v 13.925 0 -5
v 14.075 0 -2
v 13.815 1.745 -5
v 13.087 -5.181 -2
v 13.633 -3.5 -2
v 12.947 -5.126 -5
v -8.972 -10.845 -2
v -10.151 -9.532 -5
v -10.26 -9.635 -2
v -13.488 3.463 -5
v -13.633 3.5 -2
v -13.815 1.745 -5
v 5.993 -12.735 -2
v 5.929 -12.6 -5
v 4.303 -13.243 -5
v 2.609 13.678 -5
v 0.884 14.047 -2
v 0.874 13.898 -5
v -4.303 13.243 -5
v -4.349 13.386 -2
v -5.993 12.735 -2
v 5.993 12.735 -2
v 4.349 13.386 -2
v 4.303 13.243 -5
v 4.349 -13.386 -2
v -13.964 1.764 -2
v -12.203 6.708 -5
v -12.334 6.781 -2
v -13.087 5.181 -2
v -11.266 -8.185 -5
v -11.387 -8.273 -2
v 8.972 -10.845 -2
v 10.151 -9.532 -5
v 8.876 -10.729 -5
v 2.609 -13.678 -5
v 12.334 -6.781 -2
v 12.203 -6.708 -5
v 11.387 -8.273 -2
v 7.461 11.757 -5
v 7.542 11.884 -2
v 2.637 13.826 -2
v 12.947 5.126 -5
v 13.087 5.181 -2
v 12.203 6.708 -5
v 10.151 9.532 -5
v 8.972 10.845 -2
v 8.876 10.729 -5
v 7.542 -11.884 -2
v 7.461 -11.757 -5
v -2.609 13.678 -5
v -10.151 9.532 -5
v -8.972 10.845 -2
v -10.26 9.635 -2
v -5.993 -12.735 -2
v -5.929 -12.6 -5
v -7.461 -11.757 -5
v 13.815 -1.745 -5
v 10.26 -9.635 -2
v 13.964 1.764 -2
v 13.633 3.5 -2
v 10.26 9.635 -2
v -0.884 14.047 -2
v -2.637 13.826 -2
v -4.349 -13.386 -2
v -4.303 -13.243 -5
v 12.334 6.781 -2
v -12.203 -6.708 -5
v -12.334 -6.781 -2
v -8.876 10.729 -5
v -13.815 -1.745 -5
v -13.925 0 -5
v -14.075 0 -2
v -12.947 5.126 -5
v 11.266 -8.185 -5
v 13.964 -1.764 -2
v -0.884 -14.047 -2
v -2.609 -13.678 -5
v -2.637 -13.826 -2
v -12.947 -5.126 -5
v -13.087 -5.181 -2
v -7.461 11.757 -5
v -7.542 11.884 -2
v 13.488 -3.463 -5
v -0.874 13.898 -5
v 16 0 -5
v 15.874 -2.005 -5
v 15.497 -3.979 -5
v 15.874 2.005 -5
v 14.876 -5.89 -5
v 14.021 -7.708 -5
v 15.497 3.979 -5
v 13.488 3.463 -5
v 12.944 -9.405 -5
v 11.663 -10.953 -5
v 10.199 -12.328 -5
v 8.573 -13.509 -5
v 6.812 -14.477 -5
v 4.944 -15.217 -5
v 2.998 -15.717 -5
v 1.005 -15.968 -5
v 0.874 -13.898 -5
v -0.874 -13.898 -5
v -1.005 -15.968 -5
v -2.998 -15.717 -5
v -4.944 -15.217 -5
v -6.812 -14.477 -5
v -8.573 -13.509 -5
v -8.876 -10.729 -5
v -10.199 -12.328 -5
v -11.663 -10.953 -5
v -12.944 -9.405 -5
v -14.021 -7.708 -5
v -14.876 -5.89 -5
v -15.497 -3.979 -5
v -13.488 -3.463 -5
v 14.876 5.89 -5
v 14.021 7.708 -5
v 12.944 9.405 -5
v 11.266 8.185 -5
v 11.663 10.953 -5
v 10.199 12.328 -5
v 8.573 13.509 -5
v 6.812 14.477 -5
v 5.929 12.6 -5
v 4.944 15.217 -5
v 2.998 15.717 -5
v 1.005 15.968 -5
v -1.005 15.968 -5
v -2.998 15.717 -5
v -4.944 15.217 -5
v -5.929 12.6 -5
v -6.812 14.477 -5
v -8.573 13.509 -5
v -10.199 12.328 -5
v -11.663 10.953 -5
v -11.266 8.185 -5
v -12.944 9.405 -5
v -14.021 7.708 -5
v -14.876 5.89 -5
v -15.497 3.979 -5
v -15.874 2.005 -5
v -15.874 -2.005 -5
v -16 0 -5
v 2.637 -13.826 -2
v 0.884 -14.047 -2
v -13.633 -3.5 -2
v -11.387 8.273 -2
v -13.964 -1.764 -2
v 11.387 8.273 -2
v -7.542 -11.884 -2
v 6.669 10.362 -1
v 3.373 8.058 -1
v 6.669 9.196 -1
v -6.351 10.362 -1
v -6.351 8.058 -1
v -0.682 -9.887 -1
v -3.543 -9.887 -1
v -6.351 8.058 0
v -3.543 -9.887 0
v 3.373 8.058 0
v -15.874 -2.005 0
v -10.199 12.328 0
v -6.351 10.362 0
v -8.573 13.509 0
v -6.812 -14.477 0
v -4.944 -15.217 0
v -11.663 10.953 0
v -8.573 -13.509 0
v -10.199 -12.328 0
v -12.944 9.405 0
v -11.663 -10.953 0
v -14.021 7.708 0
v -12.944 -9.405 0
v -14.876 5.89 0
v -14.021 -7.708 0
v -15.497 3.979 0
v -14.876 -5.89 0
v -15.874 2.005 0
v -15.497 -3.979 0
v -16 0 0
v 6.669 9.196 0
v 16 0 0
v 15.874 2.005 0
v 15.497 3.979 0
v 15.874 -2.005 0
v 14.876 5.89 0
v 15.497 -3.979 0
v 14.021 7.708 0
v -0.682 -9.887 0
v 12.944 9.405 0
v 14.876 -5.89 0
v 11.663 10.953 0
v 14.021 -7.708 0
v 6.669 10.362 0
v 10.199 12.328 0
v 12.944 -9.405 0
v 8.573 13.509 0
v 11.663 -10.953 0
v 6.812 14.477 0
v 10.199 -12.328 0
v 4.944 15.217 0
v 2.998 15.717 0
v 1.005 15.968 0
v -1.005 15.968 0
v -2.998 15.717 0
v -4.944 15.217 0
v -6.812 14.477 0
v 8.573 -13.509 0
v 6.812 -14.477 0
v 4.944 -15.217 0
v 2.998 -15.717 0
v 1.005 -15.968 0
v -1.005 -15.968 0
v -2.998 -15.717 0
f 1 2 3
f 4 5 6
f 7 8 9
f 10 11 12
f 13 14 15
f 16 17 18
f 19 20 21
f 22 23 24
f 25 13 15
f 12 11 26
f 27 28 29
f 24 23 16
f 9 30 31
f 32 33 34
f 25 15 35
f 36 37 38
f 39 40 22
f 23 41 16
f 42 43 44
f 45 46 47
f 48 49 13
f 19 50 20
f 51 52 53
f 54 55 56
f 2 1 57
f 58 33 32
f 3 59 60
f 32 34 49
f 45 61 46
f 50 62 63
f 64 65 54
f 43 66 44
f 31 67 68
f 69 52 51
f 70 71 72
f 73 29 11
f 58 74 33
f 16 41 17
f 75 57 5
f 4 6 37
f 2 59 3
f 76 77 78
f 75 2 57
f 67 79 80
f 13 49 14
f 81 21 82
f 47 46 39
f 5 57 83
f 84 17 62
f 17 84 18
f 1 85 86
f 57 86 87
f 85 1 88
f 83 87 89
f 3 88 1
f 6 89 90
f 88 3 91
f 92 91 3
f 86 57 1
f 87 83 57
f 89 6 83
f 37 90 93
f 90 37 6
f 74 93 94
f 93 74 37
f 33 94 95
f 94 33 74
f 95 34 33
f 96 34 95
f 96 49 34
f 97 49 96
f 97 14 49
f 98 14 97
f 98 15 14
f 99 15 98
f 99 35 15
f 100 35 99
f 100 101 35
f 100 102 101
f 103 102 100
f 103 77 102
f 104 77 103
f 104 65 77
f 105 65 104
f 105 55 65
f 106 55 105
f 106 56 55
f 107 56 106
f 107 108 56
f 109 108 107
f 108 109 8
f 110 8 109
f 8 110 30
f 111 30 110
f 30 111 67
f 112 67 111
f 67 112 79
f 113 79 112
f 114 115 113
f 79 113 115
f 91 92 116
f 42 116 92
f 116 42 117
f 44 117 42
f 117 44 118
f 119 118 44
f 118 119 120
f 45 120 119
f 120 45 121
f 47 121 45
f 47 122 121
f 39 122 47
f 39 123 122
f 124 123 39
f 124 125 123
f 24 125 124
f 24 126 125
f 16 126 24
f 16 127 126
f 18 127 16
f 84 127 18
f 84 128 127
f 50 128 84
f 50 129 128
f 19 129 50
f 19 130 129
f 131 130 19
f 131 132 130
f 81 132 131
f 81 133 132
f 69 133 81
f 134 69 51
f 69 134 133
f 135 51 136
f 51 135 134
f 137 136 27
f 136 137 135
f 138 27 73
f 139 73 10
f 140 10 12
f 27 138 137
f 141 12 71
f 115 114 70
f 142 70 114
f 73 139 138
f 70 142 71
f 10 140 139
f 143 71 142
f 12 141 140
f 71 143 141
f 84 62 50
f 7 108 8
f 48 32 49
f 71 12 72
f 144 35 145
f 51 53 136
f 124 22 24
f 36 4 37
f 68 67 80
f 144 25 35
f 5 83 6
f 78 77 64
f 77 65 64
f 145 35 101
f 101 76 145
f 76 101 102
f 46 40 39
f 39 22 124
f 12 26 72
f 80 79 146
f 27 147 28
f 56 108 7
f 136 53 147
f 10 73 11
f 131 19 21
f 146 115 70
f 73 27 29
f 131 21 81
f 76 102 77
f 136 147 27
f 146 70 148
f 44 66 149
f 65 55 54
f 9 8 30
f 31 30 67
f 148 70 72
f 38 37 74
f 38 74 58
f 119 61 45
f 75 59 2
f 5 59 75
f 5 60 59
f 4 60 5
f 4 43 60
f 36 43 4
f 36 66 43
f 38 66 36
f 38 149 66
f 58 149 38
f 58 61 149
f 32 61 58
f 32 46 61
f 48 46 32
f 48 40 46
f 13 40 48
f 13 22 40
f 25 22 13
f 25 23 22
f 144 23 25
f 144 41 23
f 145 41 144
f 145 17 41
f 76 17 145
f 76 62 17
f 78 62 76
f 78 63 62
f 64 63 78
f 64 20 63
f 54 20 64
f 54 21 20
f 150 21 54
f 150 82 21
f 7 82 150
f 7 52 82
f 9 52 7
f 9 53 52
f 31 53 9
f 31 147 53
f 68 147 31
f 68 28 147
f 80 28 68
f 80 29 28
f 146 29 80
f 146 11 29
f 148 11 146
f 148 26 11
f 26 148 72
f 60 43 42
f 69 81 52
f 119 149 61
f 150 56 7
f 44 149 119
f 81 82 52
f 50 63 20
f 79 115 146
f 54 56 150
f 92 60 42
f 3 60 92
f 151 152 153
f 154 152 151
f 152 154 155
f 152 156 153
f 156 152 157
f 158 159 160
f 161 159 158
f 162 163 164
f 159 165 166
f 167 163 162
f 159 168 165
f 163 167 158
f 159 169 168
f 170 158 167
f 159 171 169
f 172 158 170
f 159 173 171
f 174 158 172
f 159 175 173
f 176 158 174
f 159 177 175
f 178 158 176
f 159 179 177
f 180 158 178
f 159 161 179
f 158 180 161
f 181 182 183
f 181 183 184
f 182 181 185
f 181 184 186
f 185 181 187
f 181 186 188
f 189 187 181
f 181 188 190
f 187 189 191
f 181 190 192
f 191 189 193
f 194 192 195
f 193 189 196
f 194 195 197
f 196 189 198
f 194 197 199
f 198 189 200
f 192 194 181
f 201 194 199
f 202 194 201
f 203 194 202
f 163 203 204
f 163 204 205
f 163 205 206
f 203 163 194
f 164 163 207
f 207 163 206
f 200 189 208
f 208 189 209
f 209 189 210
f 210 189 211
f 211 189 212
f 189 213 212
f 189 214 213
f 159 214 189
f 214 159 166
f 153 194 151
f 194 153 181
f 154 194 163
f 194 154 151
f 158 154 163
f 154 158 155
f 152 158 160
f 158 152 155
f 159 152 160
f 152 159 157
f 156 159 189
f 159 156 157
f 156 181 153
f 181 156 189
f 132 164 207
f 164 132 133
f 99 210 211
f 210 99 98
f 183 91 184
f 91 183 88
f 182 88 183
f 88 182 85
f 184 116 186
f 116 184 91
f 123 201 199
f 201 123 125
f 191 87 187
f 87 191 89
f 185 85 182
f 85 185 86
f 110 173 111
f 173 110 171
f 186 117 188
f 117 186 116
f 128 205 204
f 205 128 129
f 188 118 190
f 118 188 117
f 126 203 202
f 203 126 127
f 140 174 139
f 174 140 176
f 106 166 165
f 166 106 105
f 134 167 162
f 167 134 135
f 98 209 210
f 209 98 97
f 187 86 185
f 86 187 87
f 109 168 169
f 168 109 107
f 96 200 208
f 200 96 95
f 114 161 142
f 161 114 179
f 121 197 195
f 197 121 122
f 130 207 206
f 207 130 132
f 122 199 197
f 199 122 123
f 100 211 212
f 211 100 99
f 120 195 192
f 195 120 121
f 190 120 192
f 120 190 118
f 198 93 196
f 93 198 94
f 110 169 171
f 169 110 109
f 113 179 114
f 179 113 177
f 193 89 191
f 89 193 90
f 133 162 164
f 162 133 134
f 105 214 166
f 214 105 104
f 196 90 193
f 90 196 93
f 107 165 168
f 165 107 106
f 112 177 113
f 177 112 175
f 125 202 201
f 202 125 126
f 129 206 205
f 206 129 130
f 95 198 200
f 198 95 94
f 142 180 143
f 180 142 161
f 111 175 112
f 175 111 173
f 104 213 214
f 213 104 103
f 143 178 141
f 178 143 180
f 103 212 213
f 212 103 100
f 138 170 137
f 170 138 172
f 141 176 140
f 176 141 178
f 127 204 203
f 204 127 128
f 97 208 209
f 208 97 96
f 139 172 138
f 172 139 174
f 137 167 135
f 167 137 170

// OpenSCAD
$fn = 50;


difference() {
	union() {
		translate(v = [0, 0, -5.0000000000]) {
			cylinder(h = 5, r = 16.0000000000);
		}
	}
	union() {
		#translate(v = [0, 0, -5.0000000000]) {
			cylinder(h = 3, r1 = 13.9250000000, r2 = 14.0750000000);
		}
		translate(v = [0, 0, -1]) {
			linear_extrude(height = 1) {
				text(font = "Impact", halign = "center", size = 20, text = "7", valign = "center");
			}
		}
	}
}
